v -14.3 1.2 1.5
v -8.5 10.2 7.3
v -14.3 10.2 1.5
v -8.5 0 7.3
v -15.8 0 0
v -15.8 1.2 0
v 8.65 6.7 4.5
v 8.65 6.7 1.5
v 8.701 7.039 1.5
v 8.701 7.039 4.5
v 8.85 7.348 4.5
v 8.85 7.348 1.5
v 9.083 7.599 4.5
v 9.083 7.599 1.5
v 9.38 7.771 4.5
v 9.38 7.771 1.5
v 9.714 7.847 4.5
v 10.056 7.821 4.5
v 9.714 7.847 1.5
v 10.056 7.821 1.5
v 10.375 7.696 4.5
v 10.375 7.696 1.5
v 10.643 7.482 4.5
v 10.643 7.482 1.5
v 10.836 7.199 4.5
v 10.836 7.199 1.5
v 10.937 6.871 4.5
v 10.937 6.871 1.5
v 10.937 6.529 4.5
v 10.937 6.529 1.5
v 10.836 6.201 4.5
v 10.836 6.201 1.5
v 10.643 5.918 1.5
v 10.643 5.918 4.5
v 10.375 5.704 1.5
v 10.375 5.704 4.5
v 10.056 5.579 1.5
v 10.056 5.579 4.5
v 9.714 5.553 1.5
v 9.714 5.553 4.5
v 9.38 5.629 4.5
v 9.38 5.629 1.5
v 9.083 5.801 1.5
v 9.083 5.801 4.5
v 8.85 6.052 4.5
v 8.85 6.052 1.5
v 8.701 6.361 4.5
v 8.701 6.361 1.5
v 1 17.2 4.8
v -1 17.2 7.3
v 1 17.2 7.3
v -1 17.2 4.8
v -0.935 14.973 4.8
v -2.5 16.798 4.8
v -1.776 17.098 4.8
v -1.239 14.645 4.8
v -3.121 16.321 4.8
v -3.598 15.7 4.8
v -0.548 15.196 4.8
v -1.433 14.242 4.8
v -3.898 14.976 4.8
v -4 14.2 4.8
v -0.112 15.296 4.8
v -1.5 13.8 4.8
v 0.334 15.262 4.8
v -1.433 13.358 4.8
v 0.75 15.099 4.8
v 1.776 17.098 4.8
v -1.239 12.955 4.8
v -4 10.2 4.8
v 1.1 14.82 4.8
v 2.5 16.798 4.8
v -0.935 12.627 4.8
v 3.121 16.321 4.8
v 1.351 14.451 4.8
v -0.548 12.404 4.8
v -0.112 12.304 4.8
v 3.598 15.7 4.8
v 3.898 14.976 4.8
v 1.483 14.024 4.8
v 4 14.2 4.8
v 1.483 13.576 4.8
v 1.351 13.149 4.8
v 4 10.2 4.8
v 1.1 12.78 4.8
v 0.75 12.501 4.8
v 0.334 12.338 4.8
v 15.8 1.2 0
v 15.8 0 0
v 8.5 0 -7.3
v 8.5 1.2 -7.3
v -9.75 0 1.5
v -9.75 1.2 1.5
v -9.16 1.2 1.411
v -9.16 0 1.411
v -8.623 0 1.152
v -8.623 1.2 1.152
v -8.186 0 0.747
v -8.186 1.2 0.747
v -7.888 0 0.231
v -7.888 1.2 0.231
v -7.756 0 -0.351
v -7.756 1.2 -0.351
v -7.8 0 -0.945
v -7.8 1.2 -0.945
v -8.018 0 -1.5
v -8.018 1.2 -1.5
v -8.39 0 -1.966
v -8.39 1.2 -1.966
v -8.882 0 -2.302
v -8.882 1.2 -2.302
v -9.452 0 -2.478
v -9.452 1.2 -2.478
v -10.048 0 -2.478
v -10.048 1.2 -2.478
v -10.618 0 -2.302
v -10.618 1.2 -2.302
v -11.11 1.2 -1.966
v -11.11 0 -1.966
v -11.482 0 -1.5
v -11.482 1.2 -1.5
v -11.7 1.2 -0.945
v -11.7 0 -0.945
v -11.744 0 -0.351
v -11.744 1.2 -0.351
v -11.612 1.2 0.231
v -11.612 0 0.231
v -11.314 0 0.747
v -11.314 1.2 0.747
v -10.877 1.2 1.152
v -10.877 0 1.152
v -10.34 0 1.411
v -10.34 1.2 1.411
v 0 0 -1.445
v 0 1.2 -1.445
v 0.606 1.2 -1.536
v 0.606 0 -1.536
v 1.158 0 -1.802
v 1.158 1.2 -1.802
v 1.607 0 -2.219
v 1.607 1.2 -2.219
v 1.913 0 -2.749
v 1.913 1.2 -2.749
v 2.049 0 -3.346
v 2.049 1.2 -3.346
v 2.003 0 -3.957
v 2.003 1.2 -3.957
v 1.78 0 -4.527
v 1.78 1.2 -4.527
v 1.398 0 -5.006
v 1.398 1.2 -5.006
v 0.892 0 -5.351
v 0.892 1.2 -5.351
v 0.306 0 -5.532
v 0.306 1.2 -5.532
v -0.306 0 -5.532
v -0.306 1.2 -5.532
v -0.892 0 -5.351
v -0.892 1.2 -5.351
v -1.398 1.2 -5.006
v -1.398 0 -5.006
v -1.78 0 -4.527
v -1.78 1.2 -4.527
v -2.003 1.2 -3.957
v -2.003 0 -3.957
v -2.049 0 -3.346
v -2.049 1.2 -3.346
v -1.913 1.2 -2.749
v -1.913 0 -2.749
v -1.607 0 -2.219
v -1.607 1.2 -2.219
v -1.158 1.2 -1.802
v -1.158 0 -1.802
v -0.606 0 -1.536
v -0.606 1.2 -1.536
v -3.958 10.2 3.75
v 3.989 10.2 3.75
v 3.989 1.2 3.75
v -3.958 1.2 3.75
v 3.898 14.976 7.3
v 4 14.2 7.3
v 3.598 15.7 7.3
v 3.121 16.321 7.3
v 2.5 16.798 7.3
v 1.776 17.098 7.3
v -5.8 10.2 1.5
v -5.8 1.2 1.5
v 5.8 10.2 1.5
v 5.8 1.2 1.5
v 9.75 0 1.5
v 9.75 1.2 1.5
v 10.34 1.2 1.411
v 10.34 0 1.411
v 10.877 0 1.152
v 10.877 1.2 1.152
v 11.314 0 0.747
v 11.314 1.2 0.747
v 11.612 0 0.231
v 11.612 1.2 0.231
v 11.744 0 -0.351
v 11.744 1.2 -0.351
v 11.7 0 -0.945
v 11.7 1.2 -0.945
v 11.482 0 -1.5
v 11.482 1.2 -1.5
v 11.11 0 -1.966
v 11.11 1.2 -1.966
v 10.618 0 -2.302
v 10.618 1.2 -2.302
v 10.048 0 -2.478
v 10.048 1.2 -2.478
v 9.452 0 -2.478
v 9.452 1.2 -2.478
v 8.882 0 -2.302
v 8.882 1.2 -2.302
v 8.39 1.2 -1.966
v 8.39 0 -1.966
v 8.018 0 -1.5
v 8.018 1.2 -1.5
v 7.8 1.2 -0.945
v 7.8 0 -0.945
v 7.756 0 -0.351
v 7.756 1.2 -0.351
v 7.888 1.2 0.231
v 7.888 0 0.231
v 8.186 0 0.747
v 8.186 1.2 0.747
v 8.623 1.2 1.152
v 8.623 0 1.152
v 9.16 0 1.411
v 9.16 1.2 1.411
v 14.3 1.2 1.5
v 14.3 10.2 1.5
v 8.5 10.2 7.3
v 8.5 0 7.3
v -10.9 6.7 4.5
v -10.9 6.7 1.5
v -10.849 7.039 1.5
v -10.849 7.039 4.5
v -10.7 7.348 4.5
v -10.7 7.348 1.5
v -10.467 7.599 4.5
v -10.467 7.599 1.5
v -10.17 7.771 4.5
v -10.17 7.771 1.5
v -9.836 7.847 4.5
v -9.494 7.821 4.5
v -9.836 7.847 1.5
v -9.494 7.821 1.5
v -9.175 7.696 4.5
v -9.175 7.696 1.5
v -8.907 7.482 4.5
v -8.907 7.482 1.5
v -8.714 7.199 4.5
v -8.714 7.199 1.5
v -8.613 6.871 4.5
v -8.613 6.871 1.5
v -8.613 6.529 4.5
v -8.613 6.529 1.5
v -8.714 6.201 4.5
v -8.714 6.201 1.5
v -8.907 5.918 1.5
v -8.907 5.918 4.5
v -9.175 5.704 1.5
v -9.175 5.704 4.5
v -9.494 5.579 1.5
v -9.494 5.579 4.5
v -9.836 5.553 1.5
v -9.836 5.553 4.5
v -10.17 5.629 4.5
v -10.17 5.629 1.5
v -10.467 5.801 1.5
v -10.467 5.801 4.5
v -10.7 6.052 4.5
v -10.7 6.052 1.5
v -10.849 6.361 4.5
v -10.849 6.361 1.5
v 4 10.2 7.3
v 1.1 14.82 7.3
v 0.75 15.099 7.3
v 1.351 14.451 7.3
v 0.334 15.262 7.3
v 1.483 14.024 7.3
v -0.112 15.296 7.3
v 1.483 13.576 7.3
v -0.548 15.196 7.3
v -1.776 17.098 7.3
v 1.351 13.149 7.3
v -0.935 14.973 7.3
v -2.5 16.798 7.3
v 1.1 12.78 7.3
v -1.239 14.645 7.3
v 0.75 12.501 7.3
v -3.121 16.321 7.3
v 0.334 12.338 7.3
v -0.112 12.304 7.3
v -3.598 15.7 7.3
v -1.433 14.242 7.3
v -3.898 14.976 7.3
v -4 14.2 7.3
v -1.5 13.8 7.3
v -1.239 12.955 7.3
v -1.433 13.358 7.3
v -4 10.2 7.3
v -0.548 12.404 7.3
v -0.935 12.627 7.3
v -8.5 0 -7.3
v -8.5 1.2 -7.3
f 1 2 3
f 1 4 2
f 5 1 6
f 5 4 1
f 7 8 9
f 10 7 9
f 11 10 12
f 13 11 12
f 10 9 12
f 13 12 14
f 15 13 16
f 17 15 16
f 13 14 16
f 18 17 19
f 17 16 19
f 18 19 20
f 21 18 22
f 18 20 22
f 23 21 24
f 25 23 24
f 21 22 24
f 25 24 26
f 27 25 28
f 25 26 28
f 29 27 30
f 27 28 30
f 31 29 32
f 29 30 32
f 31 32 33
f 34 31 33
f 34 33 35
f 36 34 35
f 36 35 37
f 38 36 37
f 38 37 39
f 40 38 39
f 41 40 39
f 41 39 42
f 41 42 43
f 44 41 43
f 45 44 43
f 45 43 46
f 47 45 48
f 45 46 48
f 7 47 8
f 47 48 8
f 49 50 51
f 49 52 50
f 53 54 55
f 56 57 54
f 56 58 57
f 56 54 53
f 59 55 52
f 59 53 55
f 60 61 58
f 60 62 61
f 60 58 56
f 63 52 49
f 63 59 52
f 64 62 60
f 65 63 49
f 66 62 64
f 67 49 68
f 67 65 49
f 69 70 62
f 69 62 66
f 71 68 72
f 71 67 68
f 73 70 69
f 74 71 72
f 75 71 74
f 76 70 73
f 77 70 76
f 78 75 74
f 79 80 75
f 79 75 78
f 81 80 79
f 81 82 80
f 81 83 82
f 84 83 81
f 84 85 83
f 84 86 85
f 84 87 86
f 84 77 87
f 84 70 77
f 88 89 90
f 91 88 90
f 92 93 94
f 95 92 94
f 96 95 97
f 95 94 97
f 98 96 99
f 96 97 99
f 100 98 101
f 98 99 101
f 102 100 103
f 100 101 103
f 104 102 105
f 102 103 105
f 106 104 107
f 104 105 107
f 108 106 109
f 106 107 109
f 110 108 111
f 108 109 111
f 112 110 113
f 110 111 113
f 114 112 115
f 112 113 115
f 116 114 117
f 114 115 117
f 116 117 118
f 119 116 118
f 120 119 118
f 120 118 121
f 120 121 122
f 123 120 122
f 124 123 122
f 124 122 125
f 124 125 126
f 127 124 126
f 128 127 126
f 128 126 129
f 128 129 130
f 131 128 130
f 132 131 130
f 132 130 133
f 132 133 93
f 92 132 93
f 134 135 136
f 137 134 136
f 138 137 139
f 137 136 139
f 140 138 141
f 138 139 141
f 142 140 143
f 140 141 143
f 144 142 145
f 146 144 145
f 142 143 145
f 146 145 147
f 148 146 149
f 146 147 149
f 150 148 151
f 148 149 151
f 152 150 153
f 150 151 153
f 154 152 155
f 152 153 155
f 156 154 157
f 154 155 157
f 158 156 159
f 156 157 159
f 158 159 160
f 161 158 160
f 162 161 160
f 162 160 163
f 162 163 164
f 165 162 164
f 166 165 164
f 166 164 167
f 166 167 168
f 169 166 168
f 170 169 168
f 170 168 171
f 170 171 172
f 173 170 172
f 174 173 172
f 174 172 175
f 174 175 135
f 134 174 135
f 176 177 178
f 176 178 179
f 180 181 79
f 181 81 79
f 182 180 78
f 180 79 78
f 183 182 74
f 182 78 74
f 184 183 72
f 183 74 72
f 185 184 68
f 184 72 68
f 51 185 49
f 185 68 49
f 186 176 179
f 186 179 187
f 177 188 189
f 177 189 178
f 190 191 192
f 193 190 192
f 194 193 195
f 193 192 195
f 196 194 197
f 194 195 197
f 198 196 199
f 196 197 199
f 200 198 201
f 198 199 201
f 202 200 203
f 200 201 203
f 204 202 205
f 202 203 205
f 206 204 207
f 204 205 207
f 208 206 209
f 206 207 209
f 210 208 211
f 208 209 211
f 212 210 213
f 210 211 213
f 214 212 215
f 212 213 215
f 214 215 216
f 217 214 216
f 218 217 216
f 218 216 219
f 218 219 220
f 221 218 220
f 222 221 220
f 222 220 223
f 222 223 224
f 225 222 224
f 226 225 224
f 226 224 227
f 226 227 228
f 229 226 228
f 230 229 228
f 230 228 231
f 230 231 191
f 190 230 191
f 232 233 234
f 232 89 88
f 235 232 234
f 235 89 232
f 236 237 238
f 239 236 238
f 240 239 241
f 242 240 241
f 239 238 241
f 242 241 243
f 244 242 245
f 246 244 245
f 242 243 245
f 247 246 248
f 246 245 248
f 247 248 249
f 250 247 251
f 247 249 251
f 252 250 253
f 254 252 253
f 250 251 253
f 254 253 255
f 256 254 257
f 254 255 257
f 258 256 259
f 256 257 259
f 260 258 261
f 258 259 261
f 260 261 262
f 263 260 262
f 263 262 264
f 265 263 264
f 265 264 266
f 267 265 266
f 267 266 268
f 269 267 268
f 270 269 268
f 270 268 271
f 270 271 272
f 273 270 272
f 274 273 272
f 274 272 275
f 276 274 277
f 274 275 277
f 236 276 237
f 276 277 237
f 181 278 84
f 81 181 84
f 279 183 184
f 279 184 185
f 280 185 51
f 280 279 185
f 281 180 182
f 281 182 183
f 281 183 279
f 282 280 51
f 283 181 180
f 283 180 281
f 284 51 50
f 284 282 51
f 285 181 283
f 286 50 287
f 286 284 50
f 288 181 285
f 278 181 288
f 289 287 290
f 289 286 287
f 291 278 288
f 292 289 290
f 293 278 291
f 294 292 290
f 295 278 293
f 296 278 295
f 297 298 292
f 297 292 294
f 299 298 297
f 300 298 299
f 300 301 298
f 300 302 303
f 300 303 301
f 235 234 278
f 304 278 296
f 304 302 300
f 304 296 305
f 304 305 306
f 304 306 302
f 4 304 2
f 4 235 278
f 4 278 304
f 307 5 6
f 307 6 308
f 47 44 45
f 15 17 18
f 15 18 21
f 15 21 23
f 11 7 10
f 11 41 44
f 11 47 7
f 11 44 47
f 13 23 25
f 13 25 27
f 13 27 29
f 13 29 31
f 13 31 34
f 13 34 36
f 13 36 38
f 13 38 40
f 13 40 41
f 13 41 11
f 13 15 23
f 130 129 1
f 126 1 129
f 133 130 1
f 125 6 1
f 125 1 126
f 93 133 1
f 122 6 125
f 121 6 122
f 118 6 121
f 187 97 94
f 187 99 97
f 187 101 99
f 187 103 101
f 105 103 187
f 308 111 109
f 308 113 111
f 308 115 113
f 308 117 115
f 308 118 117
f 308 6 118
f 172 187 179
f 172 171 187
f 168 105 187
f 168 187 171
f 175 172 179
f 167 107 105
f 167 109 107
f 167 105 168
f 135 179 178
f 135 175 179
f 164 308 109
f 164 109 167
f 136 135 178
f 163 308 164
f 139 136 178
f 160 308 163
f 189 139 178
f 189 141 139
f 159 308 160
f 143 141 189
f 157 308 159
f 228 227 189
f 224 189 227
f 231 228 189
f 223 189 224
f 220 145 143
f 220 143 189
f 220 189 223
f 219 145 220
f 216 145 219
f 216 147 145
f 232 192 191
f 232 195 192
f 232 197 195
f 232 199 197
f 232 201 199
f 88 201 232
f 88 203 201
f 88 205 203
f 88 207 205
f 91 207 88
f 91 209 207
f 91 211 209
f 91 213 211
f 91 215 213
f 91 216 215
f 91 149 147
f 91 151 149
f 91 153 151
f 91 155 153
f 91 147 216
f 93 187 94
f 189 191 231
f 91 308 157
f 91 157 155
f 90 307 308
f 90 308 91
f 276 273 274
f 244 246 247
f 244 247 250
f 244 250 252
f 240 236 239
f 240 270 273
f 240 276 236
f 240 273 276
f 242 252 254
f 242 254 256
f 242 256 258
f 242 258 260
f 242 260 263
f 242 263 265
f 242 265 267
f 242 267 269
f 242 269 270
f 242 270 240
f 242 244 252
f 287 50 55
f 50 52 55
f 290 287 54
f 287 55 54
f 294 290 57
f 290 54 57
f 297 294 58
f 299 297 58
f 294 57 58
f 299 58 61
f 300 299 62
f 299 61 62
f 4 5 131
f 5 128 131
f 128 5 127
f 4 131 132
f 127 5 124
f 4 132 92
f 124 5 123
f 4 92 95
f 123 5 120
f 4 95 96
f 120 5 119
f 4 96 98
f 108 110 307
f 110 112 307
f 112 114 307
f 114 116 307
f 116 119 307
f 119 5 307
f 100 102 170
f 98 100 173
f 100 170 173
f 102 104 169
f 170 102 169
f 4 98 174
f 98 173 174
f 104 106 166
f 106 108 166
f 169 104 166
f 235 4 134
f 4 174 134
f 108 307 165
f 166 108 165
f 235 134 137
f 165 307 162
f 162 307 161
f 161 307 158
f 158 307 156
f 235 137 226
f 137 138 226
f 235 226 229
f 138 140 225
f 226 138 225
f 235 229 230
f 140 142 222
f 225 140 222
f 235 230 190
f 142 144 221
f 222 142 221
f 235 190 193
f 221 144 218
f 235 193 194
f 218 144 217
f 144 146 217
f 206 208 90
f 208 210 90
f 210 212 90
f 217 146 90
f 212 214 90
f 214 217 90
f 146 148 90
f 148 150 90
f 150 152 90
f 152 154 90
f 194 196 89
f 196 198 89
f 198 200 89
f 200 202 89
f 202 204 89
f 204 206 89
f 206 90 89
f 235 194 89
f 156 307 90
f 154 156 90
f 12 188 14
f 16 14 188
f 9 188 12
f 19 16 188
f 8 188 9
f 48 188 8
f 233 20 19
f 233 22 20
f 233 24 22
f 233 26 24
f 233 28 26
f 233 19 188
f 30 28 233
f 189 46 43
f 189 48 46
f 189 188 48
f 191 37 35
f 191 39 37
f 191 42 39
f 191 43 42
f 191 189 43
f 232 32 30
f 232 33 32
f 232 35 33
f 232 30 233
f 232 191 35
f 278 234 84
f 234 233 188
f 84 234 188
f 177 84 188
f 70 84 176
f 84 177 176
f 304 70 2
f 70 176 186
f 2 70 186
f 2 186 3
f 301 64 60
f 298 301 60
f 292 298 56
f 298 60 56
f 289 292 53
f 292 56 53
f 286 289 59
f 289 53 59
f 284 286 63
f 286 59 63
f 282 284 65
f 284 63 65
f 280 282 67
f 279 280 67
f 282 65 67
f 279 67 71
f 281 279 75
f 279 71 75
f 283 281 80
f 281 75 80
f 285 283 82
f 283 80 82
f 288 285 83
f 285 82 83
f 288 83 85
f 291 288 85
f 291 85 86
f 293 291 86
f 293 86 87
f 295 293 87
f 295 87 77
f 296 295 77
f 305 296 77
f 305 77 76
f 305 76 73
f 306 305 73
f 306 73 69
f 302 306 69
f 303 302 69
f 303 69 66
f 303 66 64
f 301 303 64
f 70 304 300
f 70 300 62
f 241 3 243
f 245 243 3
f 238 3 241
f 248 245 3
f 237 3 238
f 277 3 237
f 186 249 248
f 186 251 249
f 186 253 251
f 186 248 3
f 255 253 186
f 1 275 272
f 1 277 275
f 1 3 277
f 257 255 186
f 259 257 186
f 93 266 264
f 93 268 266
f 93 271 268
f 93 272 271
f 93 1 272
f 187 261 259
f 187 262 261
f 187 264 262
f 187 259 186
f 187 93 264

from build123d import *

# Parameters (mm, degrees)
ESBO_O1_W                = 17
ESBO_O1_H                = 14.6
RESSALTO_EXTRUS_O1_DEPTH = 1.2
ESBO_O2_R                = 2
ESBO_O2_R_2              = 2.054882152
CORTE_EXTRUS_O3_DEPTH    = 18.446203025
RESSALTO_EXTRUS_O4_DEPTH = 9
ESBO_O8_R                = 1.15
CORTE_EXTRUS_O4_DEPTH    = 3
ESBO_O10_W               = 8
ESBO_O10_H               = 2.5
RESSALTO_EXTRUS_O5_DEPTH = 7
ESBO_O11_R               = 1.5
CORTE_EXTRUS_O5_DEPTH    = 10
CORTE_EXTRUS_O8_DEPTH    = 9
FILETE1_R                = 3
FILETE2_R                = 3


with BuildPart() as part:
    # Esboço1 → Ressalto-extrusão1 (new body)
    with BuildSketch(Plane(origin=(0, 0, 0), x_dir=(1, 0, 0), z_dir=(0, 1, 0))):
        Rectangle(ESBO_O1_W, ESBO_O1_H)
        Polygon((-15.8, 0), (-8.5, 7.3), (-8.5, -7.3), align=None)
        Polygon((8.5, -7.3), (15.8, 0), (8.5, 7.3), align=None)
    extrude(amount=RESSALTO_EXTRUS_O1_DEPTH)

    # Esboço2 → Corte-extrusão3 (cut, through all)
    with BuildSketch(Plane(origin=(0, 1.2, 0), x_dir=(1, 0, 0), z_dir=(0, 1, 0))):
        with Locations(Location((-9.75, 0.5, 0), (0, 0, 270))):
            Circle(ESBO_O2_R)
        with Locations(Location((0, 3.5, 0), (0, 0, 270))):
            Circle(ESBO_O2_R_2)
        with Locations(Location((9.75, 0.5, 0), (0, 0, 270))):
            Circle(ESBO_O2_R)
    extrude(amount=-CORTE_EXTRUS_O3_DEPTH, mode=Mode.SUBTRACT)

    # Esboço6 → Ressalto-extrusão4 (add)
    with BuildSketch(Plane(origin=(0, 1.2, 0), x_dir=(1, 0, 0), z_dir=(0, 1, 0))):
        Polygon((-14.3, -1.5), (14.3, -1.5), (8.5, -7.3), (-8.5, -7.3), align=None)
    extrude(amount=RESSALTO_EXTRUS_O4_DEPTH)

    # Esboço8 → Corte-extrusão4 (cut)
    with BuildSketch(Plane(origin=(0, 0, 1.5), x_dir=(-1, 0, 0), z_dir=(0, 0, -1))):
        with Locations((-9.8, 6.7)):
            Circle(ESBO_O8_R)
        with Locations((9.75, 6.7)):
            Circle(ESBO_O8_R)
    extrude(amount=-CORTE_EXTRUS_O4_DEPTH, mode=Mode.SUBTRACT)

    # Esboço10 → Ressalto-extrusão5 (add)
    with BuildSketch(Plane(origin=(0, 10.2, 0), x_dir=(1, 0, 0), z_dir=(0, 1, 0))):
        with Locations((0, -6.05)):
            Rectangle(ESBO_O10_W, ESBO_O10_H)
    extrude(amount=RESSALTO_EXTRUS_O5_DEPTH)

    # Esboço11 → Corte-extrusão5 (cut)
    with BuildSketch(Plane(origin=(0, 0, 4.8), x_dir=(-1, 0, 0), z_dir=(0, 0, -1))):
        with Locations((0, 13.8)):
            Circle(ESBO_O11_R)
    extrude(amount=-CORTE_EXTRUS_O5_DEPTH, mode=Mode.SUBTRACT)

    # Esboço12 → Corte-extrusão8 (cut)
    with BuildSketch(Plane(origin=(0, 10.2, 0), x_dir=(1, 0, 0), z_dir=(0, 1, 0))):
        Polygon((-3.957764838, -3.75), (-5.8, -1.5), (5.8, -1.5), (3.98902582, -3.75), align=None)
    extrude(amount=-CORTE_EXTRUS_O8_DEPTH, mode=Mode.SUBTRACT)

    # Filete1
    filete1_edges = [part.edges().sort_by_distance(p)[0] for p in [
        (4, 17.2, 6.05),
    ]]
    fillet(filete1_edges, radius=FILETE1_R)

    # Filete2
    filete2_edges = [part.edges().sort_by_distance(p)[0] for p in [
        (-4, 17.2, 6.05),
    ]]
    fillet(filete2_edges, radius=FILETE2_R)


solid = part.part
